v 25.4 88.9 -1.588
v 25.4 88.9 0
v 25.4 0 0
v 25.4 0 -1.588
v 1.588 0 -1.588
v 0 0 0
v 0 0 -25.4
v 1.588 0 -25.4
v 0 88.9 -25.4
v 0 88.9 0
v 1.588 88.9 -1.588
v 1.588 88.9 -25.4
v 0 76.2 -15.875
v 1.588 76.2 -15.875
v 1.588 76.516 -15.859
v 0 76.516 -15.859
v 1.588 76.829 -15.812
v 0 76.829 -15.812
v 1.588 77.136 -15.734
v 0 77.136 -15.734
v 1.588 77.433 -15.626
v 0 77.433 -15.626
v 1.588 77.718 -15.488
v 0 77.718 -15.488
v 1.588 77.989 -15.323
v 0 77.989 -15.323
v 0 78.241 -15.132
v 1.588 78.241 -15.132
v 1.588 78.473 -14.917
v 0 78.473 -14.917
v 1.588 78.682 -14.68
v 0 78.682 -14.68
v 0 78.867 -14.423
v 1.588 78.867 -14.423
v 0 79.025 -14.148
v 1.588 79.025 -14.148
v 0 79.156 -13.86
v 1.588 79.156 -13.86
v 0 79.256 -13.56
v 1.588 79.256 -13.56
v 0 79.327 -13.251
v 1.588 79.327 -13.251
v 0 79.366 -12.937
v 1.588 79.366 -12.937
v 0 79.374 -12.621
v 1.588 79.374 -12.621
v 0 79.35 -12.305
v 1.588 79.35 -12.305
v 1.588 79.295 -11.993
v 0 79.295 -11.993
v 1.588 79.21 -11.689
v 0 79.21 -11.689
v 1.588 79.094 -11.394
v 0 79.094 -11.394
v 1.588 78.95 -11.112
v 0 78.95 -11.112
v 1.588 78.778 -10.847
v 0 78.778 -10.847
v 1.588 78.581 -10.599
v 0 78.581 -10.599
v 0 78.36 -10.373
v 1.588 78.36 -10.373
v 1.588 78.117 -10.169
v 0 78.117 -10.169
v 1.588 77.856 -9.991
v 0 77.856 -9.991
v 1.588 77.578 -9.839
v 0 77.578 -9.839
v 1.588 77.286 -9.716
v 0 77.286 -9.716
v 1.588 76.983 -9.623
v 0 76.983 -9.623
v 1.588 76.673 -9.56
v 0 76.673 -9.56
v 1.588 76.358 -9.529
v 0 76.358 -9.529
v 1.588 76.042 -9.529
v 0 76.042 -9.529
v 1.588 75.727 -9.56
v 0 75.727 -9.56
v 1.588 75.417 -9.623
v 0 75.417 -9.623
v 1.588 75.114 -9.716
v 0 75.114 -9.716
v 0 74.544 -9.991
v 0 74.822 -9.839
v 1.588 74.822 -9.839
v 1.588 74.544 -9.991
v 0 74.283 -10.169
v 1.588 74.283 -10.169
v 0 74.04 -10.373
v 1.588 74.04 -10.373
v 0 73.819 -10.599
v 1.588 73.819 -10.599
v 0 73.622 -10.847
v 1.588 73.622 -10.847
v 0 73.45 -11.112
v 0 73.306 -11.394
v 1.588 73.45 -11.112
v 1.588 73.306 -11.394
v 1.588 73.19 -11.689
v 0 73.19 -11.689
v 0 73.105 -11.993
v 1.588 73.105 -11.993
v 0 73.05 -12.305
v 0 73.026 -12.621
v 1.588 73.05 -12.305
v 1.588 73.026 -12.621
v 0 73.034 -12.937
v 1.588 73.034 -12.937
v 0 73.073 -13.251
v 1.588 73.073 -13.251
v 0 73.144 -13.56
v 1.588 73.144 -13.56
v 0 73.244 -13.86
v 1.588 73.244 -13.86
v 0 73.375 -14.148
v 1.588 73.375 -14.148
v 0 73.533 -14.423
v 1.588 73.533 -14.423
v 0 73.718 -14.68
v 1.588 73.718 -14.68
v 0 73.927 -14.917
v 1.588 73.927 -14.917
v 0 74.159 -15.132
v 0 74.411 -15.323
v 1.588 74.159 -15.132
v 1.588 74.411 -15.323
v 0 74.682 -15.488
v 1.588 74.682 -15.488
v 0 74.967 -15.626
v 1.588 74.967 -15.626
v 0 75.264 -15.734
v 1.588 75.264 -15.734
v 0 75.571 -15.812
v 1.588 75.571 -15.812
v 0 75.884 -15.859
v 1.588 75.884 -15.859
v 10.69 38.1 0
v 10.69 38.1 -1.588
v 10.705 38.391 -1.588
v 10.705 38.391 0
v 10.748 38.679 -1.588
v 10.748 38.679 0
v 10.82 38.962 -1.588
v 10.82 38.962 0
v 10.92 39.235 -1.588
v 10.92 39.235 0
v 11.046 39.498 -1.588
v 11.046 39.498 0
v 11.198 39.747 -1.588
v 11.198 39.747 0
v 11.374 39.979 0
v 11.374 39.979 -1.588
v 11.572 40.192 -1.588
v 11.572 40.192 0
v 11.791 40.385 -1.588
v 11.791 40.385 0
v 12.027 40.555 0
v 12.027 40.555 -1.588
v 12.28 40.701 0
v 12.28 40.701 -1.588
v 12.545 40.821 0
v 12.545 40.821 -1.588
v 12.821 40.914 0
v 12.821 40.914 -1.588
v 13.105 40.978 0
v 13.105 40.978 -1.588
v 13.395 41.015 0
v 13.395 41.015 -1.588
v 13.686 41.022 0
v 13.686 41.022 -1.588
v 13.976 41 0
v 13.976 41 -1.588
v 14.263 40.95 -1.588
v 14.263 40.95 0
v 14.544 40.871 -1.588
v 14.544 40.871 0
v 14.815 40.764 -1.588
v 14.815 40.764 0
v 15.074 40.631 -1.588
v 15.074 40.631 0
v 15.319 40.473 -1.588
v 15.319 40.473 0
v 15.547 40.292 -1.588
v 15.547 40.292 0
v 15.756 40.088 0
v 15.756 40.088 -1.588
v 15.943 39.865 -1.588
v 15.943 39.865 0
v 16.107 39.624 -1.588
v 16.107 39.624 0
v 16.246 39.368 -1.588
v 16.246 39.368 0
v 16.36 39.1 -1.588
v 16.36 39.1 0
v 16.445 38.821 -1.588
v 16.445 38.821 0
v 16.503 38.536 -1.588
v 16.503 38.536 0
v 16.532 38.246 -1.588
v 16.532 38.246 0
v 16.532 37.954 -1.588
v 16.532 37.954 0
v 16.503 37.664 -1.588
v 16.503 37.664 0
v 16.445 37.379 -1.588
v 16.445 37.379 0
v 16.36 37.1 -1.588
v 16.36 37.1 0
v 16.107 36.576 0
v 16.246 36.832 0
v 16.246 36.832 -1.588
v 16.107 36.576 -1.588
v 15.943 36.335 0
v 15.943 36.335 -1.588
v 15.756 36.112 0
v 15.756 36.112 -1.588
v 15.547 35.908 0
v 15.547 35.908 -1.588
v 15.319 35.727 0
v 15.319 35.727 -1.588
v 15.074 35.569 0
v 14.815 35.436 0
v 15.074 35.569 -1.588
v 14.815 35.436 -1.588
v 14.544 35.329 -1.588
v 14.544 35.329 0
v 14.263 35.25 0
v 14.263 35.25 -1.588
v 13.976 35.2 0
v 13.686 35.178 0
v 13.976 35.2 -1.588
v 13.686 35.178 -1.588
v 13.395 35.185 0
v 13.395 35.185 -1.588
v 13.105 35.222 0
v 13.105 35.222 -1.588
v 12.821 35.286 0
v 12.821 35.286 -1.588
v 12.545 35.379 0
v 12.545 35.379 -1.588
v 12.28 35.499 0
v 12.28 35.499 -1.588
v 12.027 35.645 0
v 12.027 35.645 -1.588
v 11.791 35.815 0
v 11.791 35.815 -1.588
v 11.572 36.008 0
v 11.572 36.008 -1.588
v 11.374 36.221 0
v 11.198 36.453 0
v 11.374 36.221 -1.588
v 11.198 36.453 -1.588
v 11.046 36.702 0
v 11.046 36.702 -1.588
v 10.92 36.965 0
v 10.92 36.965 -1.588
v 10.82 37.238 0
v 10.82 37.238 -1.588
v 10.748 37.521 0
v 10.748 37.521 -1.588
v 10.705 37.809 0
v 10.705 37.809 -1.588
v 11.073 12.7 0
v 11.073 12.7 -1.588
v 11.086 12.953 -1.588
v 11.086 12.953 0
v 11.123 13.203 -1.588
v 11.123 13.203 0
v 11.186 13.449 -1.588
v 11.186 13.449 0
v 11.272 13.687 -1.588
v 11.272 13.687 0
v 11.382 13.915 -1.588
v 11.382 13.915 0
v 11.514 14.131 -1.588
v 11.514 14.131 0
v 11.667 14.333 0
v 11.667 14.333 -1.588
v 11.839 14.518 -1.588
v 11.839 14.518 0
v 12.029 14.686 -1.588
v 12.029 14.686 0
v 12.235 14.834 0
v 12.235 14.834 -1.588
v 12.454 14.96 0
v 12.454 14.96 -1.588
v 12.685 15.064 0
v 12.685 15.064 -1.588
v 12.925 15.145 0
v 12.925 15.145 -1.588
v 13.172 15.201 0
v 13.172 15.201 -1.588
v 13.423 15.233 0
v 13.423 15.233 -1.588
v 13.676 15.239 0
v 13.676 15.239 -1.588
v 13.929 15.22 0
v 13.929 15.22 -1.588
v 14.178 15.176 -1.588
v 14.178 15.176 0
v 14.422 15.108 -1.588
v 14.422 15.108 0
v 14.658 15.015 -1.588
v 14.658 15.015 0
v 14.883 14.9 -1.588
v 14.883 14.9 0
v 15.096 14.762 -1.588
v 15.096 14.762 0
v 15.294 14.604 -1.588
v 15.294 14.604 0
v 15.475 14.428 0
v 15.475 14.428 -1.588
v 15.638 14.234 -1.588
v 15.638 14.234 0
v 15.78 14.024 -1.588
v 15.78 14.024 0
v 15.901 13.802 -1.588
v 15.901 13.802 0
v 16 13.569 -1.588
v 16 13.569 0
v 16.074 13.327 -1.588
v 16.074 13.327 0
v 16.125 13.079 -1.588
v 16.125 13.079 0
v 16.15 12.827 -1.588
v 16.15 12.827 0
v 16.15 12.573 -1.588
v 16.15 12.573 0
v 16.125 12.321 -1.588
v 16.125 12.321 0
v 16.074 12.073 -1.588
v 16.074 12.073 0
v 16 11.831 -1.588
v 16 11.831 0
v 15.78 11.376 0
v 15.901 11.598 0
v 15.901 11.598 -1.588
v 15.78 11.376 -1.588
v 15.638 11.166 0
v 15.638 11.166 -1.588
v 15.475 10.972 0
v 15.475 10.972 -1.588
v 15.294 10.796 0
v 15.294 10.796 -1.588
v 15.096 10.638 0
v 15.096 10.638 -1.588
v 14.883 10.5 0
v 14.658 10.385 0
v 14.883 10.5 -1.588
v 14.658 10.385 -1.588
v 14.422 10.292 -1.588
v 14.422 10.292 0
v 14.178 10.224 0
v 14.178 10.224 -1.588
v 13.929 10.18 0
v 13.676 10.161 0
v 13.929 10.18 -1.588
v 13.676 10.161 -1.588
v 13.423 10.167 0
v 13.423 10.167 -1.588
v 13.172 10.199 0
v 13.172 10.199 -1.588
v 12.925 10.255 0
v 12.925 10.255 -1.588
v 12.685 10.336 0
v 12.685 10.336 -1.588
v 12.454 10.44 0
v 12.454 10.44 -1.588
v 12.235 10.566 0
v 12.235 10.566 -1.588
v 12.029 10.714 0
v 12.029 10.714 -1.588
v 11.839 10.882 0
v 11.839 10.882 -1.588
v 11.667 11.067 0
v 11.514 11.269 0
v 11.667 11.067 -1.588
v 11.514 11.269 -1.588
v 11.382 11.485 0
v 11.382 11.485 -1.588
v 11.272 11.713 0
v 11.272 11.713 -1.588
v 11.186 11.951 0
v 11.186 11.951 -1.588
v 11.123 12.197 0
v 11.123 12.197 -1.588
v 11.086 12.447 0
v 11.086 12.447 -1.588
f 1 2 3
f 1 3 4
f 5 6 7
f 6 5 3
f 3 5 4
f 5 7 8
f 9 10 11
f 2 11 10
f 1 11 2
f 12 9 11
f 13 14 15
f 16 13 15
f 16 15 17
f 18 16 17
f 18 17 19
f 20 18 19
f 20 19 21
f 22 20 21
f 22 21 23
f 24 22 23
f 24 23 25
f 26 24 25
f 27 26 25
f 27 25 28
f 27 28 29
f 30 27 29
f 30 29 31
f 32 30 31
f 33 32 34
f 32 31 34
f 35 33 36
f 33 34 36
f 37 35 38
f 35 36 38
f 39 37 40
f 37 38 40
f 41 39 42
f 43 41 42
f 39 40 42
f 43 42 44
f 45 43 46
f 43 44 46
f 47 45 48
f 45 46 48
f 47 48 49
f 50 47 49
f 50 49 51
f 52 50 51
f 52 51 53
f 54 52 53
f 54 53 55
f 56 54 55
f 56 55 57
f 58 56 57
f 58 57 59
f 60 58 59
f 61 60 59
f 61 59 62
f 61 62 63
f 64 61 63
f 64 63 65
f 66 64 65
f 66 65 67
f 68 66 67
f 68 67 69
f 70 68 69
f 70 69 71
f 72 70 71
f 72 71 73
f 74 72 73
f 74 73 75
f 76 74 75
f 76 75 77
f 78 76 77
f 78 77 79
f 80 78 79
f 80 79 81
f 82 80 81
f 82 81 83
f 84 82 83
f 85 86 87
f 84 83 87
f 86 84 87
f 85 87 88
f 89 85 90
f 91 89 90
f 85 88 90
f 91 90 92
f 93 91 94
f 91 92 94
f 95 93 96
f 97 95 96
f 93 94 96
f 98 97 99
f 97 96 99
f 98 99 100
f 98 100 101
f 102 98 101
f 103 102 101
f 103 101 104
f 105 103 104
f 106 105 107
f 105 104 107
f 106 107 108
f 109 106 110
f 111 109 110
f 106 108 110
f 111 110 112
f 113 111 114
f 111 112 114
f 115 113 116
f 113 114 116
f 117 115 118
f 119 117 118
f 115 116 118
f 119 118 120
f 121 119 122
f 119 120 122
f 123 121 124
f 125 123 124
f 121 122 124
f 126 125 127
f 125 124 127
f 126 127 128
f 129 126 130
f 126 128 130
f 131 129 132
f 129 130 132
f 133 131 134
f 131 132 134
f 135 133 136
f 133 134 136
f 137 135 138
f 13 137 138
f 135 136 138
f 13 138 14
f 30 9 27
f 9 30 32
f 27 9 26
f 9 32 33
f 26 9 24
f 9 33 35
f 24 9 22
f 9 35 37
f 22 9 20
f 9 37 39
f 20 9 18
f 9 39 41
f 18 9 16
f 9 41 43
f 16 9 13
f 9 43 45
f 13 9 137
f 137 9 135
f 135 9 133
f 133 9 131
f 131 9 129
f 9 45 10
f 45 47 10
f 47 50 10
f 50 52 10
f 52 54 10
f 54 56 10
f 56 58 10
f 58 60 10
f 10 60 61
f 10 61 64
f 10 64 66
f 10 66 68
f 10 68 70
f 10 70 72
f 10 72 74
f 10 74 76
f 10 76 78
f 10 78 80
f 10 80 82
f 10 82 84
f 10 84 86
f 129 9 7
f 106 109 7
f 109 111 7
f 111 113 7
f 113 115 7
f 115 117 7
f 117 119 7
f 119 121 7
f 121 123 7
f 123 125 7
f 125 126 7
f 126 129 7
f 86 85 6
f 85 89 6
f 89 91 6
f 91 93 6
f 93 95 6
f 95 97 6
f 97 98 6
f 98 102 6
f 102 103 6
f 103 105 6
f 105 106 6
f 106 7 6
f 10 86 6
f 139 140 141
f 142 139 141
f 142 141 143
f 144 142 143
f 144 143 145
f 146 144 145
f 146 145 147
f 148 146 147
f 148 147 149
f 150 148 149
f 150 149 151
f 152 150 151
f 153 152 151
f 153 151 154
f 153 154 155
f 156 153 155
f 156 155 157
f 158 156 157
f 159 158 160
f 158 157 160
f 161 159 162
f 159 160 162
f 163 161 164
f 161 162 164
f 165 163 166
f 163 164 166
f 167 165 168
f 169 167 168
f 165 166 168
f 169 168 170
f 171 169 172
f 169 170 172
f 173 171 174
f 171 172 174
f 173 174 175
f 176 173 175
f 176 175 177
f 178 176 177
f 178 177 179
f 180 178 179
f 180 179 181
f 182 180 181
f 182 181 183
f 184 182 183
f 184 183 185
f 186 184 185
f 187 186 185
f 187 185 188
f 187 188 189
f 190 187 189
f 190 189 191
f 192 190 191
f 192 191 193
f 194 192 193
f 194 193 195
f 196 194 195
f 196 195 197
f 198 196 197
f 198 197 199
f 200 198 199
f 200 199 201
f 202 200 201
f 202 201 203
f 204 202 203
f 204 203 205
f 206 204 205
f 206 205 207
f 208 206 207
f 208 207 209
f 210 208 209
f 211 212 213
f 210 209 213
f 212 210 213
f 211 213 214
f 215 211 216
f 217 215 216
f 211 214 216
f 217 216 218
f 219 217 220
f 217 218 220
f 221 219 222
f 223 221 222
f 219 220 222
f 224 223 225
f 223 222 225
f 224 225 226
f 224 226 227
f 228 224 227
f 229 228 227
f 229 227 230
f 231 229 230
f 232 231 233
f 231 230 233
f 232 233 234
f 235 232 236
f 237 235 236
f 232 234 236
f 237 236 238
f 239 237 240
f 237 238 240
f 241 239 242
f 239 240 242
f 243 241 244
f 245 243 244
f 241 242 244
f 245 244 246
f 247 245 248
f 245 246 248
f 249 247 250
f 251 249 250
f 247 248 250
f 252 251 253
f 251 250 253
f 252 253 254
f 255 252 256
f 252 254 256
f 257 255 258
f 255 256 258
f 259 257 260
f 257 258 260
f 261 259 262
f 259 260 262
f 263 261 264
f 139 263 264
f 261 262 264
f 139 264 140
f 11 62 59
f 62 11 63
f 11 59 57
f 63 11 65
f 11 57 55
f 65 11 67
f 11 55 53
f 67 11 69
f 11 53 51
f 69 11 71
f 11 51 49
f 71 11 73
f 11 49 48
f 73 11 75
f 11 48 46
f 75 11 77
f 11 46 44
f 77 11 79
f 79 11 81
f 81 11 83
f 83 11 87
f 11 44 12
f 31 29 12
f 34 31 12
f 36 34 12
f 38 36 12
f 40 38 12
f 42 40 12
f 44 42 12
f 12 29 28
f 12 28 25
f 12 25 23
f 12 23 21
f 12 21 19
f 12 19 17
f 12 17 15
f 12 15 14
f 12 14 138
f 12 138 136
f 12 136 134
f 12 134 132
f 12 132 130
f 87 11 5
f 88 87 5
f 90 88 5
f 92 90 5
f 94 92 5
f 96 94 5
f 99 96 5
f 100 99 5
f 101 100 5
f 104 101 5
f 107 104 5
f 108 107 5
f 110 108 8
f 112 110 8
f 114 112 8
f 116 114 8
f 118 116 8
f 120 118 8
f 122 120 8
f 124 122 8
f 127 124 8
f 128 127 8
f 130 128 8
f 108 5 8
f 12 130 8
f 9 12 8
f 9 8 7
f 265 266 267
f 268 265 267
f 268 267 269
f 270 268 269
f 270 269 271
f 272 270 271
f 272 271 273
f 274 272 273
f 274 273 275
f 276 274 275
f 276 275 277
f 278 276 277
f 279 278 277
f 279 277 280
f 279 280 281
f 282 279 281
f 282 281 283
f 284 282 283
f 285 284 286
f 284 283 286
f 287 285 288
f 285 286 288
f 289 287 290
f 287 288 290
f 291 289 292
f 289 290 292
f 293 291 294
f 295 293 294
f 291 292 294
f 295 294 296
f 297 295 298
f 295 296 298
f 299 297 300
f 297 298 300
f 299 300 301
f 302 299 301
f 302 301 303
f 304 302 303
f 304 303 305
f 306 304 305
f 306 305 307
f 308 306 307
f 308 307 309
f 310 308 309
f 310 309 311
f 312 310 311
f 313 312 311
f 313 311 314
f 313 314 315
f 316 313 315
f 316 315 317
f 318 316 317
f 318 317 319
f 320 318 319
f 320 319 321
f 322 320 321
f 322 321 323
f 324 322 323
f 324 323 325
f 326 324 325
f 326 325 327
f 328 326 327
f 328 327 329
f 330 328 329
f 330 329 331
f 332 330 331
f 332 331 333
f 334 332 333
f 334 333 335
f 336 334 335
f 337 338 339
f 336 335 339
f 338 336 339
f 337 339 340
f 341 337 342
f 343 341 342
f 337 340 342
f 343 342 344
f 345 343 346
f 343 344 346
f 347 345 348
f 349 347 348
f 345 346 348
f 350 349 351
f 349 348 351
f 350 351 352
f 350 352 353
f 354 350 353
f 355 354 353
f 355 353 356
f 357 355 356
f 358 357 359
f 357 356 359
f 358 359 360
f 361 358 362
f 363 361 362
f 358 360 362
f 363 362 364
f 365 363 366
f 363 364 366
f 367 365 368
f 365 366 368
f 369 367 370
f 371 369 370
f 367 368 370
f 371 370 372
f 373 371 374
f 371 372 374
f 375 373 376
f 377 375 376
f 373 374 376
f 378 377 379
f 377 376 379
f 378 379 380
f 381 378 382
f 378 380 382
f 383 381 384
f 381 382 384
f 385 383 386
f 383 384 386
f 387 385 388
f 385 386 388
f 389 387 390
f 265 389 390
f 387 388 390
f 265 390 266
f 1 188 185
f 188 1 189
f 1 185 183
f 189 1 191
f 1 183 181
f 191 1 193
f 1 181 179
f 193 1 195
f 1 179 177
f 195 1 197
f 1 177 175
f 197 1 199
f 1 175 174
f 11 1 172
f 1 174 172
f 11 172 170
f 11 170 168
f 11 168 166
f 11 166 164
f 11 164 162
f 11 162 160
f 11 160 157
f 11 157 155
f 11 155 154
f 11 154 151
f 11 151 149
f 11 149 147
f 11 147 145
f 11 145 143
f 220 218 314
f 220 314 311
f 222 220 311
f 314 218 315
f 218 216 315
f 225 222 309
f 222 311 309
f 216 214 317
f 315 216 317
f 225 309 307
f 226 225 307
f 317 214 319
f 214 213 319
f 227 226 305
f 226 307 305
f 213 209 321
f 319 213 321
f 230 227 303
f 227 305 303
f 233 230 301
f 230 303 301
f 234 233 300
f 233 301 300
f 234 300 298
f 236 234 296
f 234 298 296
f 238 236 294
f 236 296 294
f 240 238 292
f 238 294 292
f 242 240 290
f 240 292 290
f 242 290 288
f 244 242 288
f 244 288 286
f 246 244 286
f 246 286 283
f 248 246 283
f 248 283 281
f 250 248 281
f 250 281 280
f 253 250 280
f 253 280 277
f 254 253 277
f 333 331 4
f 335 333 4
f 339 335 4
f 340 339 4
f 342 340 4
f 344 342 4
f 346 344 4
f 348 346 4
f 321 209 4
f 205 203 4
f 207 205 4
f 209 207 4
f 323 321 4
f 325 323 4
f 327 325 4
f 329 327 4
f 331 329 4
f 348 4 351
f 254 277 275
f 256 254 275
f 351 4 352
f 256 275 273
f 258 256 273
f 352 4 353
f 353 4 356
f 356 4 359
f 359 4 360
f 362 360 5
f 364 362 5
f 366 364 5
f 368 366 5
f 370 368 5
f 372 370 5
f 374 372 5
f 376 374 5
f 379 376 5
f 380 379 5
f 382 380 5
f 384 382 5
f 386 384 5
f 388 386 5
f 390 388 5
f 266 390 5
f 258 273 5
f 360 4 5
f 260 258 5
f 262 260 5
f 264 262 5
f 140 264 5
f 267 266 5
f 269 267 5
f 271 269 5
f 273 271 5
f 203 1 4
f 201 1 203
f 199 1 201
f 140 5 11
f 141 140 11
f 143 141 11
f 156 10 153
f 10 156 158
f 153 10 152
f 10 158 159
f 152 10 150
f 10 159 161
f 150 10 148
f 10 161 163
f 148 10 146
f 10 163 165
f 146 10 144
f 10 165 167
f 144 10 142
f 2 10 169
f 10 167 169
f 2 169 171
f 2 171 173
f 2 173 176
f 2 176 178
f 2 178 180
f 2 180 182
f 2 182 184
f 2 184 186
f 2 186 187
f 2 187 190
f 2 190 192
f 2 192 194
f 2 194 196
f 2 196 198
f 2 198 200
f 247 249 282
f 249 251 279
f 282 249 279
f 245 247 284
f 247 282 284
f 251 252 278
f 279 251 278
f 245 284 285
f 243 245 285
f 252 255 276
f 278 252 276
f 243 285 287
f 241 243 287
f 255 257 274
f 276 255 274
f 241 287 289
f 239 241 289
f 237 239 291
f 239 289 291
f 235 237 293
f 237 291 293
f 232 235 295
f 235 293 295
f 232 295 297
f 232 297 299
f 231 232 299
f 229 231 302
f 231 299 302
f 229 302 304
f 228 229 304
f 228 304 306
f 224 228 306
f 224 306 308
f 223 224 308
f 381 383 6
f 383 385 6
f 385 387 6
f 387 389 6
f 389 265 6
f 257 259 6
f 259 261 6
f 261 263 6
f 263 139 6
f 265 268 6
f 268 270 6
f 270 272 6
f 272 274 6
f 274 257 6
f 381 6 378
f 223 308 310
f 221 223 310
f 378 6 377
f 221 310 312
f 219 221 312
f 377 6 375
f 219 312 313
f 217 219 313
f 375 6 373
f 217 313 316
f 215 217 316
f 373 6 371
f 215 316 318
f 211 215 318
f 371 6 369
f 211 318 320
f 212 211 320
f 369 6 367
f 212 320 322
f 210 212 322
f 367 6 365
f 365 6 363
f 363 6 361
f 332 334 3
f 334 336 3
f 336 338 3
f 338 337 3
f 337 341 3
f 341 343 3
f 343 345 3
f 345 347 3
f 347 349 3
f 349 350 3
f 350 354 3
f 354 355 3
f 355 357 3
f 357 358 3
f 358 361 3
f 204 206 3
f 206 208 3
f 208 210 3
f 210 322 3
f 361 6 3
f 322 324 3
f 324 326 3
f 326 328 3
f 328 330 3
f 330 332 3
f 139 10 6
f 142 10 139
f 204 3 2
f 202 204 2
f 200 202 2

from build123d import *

# Parameters (mm, degrees)
BOSS_EXTRUDE1_DEPTH = 88.9
SKETCH2_R           = 2.54
SKETCH2_R_2         = 2.922857965
CUT_EXTRUDE1_DEPTH  = 88.9
SKETCH3_R           = 3.175
CUT_EXTRUDE2_DEPTH  = 88.9


with BuildPart() as part:
    # Sketch1 → Boss-Extrude1 (new body)
    with BuildSketch(Plane(origin=(0, 0, 0), x_dir=(1, 0, 0), z_dir=(0, 1, 0))):
        Polygon((0, 25.4), (0, 0), (25.4, 0), (25.4, 1.5875), (1.5875, 1.5875), (1.5875, 25.4), align=None)
    extrude(amount=BOSS_EXTRUDE1_DEPTH)

    # Sketch2 → Cut-Extrude1 (cut)
    with BuildSketch(Plane(origin=(0, 0, -1.5875), x_dir=(-1, 0, 0), z_dir=(0, 0, -1))):
        with Locations((-13.612947448, 12.7)):
            Circle(SKETCH2_R)
        with Locations((-13.612947448, 38.1)):
            Circle(SKETCH2_R_2)
    extrude(amount=-CUT_EXTRUDE1_DEPTH, mode=Mode.SUBTRACT)

    # Sketch3 → Cut-Extrude2 (cut)
    with BuildSketch(Plane(origin=(1.5875, 0, 0), x_dir=(0, 0, -1), z_dir=(1, 0, 0))):
        with Locations((12.7, 76.2)):
            Circle(SKETCH3_R)
    extrude(amount=-CUT_EXTRUDE2_DEPTH, mode=Mode.SUBTRACT)


solid = part.part
